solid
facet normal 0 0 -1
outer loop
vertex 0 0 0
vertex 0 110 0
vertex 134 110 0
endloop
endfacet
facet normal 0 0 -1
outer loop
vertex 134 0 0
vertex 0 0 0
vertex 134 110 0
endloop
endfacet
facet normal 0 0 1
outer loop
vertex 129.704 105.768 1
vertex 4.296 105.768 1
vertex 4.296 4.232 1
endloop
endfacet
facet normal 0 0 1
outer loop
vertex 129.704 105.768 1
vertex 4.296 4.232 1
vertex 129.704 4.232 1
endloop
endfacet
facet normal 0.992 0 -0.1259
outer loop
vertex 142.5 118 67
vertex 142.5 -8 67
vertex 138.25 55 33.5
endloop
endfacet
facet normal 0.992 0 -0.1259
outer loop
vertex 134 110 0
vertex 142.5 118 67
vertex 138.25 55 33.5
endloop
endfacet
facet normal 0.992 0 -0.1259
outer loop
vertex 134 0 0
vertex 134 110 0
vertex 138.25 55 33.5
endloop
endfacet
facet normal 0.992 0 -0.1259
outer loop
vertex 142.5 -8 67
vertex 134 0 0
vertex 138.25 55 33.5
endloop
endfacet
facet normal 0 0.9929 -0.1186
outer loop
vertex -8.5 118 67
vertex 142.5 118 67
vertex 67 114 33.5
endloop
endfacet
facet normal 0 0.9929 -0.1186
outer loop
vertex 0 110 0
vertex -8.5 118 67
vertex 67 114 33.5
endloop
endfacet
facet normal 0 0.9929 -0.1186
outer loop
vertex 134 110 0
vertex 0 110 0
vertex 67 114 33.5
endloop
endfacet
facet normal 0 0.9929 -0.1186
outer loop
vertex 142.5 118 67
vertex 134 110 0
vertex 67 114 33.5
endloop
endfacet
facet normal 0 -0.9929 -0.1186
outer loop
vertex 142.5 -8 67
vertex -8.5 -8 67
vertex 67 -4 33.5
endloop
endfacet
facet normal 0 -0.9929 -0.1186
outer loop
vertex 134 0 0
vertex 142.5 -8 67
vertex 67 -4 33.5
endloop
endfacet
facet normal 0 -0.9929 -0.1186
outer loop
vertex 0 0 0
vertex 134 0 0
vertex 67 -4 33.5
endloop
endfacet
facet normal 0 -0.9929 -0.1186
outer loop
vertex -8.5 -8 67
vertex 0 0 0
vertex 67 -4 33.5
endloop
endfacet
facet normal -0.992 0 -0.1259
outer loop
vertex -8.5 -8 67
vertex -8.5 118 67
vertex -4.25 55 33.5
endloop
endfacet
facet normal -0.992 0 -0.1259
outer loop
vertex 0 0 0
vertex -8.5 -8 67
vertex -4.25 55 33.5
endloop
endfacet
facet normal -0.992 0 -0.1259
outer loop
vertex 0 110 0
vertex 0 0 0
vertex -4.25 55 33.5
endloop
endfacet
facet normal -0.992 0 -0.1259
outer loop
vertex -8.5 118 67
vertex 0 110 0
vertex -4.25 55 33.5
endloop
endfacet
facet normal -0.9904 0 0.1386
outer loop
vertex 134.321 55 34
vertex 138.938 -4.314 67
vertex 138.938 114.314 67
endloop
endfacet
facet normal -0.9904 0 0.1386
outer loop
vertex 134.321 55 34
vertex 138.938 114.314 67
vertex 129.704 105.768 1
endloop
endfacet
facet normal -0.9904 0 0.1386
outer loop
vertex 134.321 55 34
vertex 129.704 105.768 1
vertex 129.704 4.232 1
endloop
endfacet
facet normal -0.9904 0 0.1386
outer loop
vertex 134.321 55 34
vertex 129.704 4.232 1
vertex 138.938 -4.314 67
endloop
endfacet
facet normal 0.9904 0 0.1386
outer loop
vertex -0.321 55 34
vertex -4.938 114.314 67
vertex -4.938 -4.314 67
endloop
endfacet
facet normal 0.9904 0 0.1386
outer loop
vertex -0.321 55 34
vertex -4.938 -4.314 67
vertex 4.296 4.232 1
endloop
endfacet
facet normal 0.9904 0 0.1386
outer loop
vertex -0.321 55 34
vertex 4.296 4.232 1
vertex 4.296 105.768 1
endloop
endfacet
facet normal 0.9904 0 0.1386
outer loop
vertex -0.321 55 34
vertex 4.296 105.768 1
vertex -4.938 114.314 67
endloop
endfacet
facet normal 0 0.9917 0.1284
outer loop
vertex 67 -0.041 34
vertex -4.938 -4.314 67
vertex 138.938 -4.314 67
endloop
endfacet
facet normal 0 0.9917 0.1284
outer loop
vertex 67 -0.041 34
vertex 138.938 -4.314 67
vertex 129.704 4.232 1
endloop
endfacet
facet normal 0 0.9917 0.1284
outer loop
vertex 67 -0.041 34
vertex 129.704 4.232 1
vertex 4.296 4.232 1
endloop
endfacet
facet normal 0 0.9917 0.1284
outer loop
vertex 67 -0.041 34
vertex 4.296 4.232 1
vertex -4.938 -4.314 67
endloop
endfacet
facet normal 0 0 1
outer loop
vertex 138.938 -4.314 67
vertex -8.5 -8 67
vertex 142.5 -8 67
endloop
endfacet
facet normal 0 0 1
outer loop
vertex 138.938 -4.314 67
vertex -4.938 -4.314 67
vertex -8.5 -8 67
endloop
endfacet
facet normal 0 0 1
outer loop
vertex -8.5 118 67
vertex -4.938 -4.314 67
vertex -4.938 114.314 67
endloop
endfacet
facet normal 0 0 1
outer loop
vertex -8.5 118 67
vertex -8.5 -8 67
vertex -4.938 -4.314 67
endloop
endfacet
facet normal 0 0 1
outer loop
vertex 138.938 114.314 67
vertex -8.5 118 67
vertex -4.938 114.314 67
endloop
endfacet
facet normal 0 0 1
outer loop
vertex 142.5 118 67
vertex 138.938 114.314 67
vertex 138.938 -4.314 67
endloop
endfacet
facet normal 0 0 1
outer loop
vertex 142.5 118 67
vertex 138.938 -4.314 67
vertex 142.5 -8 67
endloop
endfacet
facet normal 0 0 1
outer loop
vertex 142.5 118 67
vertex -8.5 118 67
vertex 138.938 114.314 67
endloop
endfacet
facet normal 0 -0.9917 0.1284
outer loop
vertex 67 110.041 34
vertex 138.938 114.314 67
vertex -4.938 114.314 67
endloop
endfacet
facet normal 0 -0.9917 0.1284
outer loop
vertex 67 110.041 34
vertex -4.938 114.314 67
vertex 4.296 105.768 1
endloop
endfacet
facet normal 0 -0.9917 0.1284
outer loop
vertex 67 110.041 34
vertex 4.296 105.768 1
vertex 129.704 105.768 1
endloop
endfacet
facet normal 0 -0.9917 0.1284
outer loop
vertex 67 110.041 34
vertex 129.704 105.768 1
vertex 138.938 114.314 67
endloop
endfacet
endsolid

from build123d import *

# Parameters (mm, degrees)
SKETCH_2_W = 151
SKETCH_2_H = 126
SKETCH_1_W = 134
SKETCH_1_H = 110
SKETCH_3_W = 143.875710796
SKETCH_3_H = 118.62726712
SKETCH_4_W = 125.407231672
SKETCH_4_H = 101.536444544


with BuildPart() as part:
    # 草图2 → 放样2 section 0
    with BuildSketch(Plane.XY.offset(67)):
        with Locations((67, 55)):
            Rectangle(SKETCH_2_W, SKETCH_2_H)
    # 草图1 → 放样2 section 1
    with BuildSketch(Plane.XY):
        with Locations((67, 55)):
            Rectangle(SKETCH_1_W, SKETCH_1_H)
    loft()

    # 草图3 → 切除-放样3 section 0
    with BuildSketch(Plane.XY.offset(67)):
        with Locations((67, 55)):
            Rectangle(SKETCH_3_W, SKETCH_3_H)
    # 草图4 → 切除-放样3 section 1
    with BuildSketch(Plane(origin=(0, 0, 1), x_dir=(-1, 0, 0), z_dir=(0, 0, -1))):
        with Locations((-67, 55)):
            Rectangle(SKETCH_4_W, SKETCH_4_H)
    loft(mode=Mode.SUBTRACT)


solid = part.part
